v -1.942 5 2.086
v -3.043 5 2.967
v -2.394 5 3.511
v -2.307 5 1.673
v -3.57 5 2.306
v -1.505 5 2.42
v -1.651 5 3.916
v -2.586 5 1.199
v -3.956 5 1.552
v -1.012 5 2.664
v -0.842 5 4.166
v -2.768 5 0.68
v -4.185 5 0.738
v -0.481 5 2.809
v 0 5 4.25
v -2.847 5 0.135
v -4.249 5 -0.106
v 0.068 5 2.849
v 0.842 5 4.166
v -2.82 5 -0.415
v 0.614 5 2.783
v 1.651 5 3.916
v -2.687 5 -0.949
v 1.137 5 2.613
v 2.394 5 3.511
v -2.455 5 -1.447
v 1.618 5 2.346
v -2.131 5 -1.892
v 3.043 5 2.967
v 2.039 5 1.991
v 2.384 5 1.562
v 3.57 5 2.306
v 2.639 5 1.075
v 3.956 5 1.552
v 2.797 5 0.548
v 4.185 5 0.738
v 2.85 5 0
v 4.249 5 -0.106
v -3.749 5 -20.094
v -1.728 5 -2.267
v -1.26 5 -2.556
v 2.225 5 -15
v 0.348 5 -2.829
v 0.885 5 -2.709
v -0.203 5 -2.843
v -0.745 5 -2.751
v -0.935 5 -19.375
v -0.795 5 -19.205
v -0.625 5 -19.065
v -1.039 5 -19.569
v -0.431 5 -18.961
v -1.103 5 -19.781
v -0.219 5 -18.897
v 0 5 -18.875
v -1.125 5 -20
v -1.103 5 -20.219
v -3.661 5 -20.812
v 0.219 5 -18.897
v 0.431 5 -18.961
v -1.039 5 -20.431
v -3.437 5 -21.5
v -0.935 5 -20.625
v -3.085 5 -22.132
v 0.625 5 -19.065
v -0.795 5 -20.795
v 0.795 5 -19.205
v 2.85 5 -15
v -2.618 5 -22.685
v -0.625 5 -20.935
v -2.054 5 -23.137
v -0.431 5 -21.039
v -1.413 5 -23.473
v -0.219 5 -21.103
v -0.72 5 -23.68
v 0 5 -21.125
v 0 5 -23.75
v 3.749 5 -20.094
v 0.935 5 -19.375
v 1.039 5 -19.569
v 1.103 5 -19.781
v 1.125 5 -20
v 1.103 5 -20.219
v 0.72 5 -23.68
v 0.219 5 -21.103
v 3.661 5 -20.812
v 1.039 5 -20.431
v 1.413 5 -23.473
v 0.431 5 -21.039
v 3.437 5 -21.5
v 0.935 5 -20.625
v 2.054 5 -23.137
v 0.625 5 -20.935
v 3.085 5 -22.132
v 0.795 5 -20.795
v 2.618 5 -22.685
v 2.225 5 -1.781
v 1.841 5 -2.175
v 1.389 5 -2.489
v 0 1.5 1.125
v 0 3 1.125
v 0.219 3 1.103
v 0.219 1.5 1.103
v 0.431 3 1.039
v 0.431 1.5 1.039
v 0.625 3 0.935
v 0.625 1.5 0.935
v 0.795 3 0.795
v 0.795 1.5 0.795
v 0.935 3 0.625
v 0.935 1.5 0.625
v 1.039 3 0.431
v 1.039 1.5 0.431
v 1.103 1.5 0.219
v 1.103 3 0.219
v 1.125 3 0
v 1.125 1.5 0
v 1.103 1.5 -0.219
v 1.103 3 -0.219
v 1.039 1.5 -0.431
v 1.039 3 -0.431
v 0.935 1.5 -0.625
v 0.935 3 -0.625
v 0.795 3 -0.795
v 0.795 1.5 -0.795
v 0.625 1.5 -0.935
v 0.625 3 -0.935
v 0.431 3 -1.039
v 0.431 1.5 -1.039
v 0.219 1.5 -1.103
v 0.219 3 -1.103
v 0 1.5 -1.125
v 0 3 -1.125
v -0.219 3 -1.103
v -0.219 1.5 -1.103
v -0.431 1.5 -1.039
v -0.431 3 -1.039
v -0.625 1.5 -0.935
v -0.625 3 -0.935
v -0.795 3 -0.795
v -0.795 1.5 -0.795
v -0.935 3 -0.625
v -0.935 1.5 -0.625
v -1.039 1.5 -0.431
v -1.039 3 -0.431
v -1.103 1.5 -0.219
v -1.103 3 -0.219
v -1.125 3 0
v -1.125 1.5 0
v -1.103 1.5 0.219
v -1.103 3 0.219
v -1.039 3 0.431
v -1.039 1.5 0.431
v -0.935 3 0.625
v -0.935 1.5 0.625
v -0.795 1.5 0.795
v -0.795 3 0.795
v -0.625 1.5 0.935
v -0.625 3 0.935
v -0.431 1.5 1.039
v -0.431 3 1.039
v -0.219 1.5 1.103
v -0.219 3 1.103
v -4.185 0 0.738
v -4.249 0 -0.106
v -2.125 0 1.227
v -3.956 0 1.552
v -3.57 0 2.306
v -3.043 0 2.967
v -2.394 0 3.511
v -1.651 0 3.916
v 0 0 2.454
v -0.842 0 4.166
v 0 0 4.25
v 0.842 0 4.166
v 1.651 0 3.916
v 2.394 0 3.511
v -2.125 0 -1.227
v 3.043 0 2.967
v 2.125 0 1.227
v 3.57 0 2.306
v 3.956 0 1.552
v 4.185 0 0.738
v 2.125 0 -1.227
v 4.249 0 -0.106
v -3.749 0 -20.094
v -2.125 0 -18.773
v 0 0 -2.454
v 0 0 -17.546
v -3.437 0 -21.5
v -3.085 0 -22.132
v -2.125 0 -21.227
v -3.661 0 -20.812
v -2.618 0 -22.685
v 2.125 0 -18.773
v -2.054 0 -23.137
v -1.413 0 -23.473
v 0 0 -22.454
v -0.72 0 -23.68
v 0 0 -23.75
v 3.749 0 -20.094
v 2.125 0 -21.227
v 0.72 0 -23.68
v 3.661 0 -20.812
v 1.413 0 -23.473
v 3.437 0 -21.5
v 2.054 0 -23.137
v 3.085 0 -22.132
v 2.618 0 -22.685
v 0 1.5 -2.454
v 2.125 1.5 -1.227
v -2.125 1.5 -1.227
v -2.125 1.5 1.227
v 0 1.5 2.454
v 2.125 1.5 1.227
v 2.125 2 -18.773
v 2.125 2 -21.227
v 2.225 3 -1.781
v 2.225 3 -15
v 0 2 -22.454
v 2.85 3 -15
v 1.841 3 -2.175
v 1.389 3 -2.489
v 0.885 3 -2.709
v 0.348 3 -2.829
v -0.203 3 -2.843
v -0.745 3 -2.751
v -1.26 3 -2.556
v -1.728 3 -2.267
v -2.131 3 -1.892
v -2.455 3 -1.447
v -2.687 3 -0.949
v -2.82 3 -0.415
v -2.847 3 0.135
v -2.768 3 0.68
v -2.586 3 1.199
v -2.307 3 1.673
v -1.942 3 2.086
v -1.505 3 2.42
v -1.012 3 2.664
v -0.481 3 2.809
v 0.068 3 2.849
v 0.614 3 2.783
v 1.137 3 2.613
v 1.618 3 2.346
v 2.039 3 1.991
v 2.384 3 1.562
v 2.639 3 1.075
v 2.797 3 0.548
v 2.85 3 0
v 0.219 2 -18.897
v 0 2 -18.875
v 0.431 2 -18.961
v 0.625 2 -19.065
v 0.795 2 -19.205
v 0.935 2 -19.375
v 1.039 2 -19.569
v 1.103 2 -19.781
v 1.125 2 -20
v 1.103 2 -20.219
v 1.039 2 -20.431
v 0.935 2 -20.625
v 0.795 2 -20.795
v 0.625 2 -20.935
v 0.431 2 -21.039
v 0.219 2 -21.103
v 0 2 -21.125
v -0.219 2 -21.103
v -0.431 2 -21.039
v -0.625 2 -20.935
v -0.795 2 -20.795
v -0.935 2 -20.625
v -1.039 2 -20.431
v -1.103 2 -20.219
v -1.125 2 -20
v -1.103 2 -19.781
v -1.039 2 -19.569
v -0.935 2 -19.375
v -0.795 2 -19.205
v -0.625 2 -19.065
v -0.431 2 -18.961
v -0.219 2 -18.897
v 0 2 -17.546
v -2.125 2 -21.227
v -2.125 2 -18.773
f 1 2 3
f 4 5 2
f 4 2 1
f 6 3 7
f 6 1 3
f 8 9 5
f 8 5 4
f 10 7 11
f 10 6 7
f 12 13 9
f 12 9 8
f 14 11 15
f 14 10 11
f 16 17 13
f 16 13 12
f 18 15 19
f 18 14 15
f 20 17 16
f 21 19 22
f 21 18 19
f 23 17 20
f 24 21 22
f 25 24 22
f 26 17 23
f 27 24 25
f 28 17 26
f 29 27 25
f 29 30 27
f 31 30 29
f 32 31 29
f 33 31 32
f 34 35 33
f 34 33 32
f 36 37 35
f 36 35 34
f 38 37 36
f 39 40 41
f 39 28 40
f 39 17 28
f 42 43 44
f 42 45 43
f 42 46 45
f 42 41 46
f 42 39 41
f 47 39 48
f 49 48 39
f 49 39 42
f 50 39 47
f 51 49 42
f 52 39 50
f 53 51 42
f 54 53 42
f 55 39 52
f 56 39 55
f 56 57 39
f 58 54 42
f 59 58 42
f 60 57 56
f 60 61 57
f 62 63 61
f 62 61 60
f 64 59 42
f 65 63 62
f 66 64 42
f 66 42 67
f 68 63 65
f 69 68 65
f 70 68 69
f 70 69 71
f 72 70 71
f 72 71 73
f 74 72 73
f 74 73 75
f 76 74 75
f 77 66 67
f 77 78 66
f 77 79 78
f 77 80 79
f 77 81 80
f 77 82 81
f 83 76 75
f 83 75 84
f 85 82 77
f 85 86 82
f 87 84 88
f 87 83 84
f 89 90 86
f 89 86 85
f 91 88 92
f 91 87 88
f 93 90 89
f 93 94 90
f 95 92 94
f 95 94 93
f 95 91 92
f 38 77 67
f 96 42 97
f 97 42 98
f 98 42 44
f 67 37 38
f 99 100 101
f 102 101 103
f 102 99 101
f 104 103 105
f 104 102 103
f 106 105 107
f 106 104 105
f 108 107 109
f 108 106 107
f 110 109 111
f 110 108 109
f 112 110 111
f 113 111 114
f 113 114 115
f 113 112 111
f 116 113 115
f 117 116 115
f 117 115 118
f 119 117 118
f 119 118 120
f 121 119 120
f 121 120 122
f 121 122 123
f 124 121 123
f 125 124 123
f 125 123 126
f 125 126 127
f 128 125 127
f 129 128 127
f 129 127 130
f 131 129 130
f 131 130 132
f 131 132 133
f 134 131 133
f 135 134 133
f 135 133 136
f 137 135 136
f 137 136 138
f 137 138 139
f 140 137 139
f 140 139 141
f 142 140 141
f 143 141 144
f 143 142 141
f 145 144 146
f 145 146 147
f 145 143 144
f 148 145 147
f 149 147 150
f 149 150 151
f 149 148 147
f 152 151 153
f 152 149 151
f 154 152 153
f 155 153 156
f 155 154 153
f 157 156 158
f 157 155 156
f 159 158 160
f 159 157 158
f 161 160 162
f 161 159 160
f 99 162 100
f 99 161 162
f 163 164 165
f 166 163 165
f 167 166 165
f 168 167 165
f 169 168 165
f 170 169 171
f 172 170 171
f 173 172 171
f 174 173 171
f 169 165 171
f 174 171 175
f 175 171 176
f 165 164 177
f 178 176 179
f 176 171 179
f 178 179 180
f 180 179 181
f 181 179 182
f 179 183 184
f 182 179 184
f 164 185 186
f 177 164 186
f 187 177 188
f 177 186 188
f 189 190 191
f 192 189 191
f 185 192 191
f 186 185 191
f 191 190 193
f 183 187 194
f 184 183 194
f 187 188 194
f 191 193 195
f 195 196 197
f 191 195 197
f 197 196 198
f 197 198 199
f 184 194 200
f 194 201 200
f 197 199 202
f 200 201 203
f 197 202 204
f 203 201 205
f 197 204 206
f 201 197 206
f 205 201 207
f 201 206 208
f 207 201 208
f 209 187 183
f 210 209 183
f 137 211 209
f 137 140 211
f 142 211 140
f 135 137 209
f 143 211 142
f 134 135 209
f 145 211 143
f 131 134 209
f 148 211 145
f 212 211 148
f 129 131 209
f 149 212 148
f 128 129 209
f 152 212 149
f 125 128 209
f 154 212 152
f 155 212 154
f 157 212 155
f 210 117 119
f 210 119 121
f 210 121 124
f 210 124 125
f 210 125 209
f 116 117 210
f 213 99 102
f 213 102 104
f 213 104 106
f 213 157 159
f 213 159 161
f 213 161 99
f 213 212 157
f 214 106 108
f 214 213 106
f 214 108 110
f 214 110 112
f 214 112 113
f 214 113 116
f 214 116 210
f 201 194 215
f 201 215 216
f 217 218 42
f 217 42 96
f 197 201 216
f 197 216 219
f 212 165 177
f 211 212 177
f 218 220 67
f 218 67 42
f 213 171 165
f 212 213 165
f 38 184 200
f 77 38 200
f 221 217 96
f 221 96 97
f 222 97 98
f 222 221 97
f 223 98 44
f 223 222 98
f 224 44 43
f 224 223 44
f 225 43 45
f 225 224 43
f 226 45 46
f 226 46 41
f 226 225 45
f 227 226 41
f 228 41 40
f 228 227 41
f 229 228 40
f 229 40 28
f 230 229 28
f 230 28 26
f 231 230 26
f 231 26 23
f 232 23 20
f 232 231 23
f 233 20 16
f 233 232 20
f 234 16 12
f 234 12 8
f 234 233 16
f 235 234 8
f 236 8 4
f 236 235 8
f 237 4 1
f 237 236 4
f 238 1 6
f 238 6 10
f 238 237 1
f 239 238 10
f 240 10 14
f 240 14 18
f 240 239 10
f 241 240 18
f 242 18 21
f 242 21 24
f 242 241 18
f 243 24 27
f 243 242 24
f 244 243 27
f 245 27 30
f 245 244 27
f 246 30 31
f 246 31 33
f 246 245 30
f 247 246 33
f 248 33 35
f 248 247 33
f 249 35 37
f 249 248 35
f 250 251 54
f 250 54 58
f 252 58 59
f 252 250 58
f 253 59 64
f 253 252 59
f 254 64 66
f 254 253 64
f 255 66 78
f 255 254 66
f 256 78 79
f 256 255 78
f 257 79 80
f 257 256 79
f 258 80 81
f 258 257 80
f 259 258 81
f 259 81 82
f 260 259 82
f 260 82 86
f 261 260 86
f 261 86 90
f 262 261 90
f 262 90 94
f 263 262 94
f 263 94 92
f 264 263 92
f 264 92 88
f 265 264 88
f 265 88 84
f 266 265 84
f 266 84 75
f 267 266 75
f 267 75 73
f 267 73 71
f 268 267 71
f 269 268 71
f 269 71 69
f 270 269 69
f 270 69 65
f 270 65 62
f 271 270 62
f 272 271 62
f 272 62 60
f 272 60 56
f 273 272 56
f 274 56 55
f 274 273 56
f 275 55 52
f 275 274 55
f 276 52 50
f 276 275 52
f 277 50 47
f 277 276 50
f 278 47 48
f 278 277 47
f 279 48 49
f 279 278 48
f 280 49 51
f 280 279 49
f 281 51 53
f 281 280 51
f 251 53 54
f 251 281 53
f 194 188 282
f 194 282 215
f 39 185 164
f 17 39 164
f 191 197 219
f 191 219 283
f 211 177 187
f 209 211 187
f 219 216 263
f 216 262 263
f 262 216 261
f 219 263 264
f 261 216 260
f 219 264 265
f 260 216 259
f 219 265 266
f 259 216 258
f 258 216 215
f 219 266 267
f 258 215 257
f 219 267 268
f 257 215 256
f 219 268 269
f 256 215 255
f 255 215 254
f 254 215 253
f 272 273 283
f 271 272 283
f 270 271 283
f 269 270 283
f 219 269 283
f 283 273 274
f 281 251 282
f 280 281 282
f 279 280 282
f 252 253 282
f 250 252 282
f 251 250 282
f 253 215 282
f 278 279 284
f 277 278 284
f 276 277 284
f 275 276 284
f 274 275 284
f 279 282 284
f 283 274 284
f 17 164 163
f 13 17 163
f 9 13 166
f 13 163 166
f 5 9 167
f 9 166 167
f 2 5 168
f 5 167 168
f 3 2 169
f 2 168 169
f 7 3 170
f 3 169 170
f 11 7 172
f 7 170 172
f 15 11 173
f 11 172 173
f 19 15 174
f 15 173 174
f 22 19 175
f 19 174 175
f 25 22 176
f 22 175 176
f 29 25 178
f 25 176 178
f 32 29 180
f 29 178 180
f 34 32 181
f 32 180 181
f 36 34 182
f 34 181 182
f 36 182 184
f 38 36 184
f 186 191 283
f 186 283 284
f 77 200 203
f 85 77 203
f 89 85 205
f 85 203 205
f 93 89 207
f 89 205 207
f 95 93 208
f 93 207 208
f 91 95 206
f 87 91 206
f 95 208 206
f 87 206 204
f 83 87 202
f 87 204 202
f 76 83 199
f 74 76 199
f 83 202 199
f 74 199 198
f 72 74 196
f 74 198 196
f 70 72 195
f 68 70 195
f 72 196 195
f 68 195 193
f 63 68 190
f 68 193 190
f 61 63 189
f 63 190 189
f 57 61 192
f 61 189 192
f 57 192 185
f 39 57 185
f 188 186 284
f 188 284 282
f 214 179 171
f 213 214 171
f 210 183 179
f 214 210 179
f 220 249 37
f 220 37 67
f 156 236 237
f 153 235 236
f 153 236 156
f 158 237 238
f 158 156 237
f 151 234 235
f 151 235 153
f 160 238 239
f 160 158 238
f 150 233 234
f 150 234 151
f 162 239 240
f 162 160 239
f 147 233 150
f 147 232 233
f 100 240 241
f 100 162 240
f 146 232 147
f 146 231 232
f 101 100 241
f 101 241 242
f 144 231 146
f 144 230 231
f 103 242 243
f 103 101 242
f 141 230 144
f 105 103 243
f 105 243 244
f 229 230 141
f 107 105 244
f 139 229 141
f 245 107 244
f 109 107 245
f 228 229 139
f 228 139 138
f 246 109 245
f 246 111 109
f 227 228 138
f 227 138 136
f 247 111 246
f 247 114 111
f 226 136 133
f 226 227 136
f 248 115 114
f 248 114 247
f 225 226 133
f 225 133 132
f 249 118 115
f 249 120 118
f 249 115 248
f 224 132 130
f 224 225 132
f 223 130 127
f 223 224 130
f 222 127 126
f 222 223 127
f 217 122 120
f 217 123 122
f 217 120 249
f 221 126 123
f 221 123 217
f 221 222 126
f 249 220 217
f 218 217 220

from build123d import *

# Parameters (mm, degrees)
SKETCH1_R           = 1.125
BOSS_EXTRUDE1_DEPTH = 5
CUT_EXTRUDE1_START  = -2
SKETCH2_R           = 1.125
CUT_EXTRUDE1_DEPTH  = 2
SKETCH3_R           = 1.125
CUT_EXTRUDE2_DEPTH  = 1.5
CUT_EXTRUDE3_DEPTH  = 2


with BuildPart() as part:
    # Sketch1 → Boss-Extrude1 (new body)
    with BuildSketch(Plane(origin=(0, 0, 0), x_dir=(1, 0, 0), z_dir=(0, 1, 0))):
        with BuildLine():
            Line((4.248671667, 0.10625), (3.748827942, 20.09375))
            ThreePointArc((3.748827942, 20.09375), (0, 23.75), (-3.748827942, 20.09375))
            Line((-3.748827942, 20.09375), (-4.248671667, 0.10625))
            ThreePointArc((-4.248671667, 0.10625), (0, -4.25), (4.248671667, 0.10625))
        make_face()
        Circle(SKETCH1_R, mode=Mode.SUBTRACT)
        with Locations((0, 20)):
            Circle(SKETCH1_R, mode=Mode.SUBTRACT)
    extrude(amount=BOSS_EXTRUDE1_DEPTH)

    # Sketch2 → Cut-Extrude1 (cut)
    # profile 1 of 2: a face of its own
    with BuildSketch(Plane(origin=(0, 5, 0), x_dir=(1, 0, 0), z_dir=(0, 1, 0)).offset(CUT_EXTRUDE1_START)):
        with BuildLine():
            ThreePointArc((2.225, 1.780975856), (-2.689214569, -0.943729304), (2.85, 0))
            ThreePointArc((2.85, 0), (2.689214569, 0.943729304), (2.225, 1.780975856))
        make_face()
        Circle(SKETCH2_R, mode=Mode.SUBTRACT)
    # profile 2 of 2: a face of its own
    with BuildSketch(Plane(origin=(0, 5, 0), x_dir=(1, 0, 0), z_dir=(0, 1, 0)).offset(CUT_EXTRUDE1_START)):
        with BuildLine():
            ThreePointArc((2.225, 1.780975856), (2.689214569, 0.943729304), (2.85, 0))
            Line((2.85, 0), (2.85, 15))
            Line((2.85, 15), (2.225, 15))
            Line((2.225, 15), (2.225, 1.780975856))
        make_face()
    extrude(amount=CUT_EXTRUDE1_DEPTH, mode=Mode.SUBTRACT)

    # Sketch3 → Cut-Extrude2 (cut)
    with BuildSketch(Plane.XZ):
        Polygon((2.125, 1.226869322), (0, 2.453738644), (-2.125, 1.226869322), (-2.125, -1.226869322), (0, -2.453738644), (2.125, -1.226869322), align=None)
        Circle(SKETCH3_R, mode=Mode.SUBTRACT)
    extrude(amount=-CUT_EXTRUDE2_DEPTH, mode=Mode.SUBTRACT)

    # Sketch3<3> → Cut-Extrude3 (cut)
    with BuildSketch(Plane.XZ):
        Polygon((2.125, -21.226869322), (0, -22.453738644), (-2.125, -21.226869322), (-2.125, -18.773130678), (0, -17.546261356), (2.125, -18.773130678), align=None)
    extrude(amount=-CUT_EXTRUDE3_DEPTH, mode=Mode.SUBTRACT)


solid = part.part
